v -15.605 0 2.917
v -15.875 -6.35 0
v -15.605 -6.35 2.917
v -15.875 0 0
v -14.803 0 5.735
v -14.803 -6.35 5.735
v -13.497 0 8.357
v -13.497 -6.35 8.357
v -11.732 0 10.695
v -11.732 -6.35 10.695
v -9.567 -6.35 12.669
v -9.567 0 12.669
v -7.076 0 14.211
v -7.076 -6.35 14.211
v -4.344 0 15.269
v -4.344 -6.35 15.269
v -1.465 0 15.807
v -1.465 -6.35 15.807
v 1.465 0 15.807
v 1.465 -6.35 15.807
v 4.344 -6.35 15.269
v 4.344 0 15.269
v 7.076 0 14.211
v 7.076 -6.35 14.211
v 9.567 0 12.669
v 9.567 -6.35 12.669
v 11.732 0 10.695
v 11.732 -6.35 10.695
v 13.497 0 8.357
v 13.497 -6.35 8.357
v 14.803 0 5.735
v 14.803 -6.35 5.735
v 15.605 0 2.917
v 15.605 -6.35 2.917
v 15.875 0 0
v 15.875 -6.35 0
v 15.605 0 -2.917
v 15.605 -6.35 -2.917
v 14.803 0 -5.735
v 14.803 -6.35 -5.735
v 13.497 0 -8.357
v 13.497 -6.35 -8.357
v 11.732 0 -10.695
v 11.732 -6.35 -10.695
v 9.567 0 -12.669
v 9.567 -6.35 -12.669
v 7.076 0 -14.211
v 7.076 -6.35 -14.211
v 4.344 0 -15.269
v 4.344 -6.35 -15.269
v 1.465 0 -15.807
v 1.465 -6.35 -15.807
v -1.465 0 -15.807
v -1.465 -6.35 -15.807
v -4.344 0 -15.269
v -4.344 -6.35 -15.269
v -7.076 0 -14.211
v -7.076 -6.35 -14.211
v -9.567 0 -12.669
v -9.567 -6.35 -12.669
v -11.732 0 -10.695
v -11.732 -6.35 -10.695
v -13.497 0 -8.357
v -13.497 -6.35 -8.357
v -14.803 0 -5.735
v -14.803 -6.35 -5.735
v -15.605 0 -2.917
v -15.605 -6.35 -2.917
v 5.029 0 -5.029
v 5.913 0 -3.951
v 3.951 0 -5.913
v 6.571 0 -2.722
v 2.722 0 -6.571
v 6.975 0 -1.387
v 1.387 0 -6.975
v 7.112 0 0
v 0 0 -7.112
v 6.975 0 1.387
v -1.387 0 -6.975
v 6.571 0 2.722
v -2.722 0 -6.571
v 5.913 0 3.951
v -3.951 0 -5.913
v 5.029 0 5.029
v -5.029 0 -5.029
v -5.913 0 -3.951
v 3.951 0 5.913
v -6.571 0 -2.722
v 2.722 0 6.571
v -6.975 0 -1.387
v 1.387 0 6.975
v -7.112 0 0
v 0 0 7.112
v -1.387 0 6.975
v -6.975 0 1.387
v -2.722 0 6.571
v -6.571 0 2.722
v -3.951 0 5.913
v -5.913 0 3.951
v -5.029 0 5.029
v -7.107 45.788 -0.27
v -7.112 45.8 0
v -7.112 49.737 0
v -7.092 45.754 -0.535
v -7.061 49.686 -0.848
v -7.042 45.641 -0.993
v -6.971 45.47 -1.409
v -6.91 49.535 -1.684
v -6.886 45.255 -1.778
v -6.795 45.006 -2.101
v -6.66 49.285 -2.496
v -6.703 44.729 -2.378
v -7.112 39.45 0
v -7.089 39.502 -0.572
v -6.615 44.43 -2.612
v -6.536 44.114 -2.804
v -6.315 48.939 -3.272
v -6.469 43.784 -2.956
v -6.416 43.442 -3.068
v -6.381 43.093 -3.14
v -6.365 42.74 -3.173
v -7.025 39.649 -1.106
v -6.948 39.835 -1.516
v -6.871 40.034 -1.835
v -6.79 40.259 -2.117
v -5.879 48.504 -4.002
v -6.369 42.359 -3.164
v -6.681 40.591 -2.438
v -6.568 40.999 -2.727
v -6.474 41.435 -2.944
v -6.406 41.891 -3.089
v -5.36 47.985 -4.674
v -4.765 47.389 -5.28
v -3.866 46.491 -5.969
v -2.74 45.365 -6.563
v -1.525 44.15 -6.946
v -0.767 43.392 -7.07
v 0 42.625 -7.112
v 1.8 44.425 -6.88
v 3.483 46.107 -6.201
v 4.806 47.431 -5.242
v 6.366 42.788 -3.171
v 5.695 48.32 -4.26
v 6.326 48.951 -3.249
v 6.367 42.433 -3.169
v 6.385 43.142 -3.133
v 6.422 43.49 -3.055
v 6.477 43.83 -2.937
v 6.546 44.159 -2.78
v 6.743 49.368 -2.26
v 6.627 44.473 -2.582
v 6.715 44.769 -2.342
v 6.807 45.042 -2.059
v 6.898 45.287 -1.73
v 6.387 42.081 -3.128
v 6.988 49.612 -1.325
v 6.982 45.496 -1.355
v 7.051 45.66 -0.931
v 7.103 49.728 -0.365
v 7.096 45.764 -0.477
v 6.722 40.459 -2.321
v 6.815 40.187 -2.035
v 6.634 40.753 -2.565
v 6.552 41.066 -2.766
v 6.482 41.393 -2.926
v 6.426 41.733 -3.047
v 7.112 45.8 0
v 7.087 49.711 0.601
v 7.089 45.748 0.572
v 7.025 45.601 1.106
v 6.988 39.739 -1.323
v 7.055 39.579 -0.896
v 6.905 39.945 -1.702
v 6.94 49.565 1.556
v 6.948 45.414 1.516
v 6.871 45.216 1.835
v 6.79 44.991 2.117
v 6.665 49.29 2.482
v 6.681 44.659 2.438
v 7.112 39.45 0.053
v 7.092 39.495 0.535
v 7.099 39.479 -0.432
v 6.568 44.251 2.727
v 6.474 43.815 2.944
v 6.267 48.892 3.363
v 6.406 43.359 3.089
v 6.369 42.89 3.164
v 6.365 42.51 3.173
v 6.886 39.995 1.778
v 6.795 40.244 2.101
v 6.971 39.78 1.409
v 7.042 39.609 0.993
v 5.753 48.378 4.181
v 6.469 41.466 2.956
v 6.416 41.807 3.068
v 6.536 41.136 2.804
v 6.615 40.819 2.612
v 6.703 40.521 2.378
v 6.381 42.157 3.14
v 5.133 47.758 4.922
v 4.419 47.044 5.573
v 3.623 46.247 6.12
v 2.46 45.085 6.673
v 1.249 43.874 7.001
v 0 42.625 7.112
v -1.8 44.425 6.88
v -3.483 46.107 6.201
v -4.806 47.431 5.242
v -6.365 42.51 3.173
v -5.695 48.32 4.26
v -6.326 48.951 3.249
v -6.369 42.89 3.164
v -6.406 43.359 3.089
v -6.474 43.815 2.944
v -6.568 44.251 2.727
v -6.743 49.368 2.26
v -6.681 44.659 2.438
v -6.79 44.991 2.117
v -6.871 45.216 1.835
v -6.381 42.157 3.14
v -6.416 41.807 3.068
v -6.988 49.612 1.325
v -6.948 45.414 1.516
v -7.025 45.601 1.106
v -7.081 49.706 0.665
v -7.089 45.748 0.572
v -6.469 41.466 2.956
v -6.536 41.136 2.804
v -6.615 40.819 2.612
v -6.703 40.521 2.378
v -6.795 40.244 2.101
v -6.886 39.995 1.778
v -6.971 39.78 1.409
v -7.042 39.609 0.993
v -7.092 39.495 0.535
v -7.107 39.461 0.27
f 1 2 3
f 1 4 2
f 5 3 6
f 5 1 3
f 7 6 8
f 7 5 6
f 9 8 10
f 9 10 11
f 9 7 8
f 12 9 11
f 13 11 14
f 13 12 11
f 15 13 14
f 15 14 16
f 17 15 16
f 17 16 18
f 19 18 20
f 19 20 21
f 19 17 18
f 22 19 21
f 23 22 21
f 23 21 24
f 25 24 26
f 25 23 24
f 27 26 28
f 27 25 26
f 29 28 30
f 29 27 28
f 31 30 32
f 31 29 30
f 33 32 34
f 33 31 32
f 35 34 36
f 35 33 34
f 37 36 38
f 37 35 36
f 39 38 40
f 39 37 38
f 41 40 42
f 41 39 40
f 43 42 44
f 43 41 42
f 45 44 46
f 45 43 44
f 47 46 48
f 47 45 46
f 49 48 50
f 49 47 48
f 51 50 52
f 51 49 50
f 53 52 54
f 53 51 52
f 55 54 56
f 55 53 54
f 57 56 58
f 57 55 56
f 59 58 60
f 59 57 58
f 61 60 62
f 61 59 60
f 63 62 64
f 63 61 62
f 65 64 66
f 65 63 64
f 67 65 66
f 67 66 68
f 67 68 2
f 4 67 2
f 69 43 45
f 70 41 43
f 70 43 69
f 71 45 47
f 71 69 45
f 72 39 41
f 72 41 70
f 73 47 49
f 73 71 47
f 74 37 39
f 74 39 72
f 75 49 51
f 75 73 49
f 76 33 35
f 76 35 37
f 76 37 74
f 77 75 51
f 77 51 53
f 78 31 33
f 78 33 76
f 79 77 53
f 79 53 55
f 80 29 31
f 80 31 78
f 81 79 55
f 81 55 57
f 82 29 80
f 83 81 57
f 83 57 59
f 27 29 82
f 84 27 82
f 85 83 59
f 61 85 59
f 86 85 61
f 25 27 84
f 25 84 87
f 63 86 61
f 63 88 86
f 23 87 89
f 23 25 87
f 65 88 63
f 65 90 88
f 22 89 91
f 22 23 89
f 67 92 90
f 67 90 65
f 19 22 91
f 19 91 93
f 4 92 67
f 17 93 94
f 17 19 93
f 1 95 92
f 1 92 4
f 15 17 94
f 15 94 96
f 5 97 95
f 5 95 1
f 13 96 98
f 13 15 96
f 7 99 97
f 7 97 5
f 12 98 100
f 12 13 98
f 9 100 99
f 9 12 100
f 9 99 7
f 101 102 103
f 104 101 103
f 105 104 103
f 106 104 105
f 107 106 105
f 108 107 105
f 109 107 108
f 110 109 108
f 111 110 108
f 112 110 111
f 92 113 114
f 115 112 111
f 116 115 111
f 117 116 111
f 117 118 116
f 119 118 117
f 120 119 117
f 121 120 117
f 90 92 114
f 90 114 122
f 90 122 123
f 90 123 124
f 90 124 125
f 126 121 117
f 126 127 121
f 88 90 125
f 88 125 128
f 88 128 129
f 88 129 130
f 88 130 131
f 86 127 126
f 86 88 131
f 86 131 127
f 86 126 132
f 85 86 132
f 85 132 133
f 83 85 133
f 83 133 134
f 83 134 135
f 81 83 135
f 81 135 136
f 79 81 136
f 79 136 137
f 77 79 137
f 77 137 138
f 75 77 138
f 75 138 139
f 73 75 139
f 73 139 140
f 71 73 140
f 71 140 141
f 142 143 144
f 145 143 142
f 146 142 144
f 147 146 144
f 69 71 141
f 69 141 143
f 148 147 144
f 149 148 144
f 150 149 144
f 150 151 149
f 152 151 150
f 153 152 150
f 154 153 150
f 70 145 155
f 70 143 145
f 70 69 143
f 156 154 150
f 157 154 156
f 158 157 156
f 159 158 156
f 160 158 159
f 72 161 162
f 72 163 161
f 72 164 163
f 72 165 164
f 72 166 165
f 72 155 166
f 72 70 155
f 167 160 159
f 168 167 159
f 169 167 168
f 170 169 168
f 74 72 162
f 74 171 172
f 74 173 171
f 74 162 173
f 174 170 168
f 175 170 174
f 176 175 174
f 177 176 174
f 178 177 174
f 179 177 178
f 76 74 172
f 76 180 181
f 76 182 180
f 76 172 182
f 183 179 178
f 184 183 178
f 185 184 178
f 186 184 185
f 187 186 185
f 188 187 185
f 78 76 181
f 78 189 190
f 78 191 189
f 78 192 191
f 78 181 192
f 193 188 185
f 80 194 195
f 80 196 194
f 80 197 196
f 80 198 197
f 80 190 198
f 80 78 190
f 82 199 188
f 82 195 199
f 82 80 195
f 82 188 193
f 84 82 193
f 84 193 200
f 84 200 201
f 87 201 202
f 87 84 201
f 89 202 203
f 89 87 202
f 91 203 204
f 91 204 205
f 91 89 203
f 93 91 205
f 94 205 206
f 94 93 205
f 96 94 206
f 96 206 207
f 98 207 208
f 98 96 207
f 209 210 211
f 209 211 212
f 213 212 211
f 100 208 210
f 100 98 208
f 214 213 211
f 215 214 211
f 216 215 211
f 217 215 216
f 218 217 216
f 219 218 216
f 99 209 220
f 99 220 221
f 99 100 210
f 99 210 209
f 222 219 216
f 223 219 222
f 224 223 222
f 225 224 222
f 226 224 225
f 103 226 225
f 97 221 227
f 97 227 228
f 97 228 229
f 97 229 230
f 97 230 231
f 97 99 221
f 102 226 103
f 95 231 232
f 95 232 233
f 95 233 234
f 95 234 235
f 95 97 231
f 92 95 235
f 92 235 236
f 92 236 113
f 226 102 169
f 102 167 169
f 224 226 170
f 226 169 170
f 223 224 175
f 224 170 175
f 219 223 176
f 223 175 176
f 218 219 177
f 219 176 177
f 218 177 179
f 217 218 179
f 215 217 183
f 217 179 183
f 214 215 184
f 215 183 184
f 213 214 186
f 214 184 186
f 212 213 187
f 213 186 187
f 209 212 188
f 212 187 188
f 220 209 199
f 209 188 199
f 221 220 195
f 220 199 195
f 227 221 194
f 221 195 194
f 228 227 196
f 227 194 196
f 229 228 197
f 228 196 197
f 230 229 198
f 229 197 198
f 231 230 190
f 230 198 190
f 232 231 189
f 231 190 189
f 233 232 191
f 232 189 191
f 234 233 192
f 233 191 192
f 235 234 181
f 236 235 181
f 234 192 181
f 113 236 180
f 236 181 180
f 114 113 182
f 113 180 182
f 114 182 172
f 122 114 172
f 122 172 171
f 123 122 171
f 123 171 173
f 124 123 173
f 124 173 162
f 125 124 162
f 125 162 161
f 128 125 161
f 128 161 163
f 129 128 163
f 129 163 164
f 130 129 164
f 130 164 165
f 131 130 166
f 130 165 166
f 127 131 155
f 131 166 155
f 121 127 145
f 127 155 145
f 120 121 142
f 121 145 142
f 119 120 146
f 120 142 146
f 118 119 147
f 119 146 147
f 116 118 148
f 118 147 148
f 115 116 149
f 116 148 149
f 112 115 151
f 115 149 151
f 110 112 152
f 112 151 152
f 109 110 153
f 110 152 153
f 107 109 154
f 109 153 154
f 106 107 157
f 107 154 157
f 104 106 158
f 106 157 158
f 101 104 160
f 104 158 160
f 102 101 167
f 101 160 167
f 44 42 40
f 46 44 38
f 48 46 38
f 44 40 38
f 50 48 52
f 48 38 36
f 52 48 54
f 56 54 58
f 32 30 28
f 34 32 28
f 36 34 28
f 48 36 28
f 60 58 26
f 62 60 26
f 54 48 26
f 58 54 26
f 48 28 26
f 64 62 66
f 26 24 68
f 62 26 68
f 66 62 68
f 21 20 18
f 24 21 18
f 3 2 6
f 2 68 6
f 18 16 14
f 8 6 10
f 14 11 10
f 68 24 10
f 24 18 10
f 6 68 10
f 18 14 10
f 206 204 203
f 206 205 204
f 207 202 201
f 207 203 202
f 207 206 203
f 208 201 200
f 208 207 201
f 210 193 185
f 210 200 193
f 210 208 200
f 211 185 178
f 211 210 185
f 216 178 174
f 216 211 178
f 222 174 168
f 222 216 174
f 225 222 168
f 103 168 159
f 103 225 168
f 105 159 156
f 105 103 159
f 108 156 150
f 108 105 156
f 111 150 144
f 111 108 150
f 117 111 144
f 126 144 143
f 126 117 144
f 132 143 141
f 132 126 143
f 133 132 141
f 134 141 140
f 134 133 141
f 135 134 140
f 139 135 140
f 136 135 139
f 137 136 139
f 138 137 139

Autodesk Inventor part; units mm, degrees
ref_plane "YZ Plane" through (0, 0, 0) normal (1, 0, 0) x (0, 1, 0)
ref_plane "XZ Plane" through (0, 0, 0) normal (0, 1, 0) x (-1, 0, 0)
ref_plane "XY Plane" through (0, 0, 0) normal (0, 0, 1) x (1, 0, 0)
sketch "Sketch1" plane through (0, 0, 0) normal (0, 1, 0) x (-1, 0, 0)
  circle A0 centre (0, 0) radius 15.875
  circle A1 centre (0, 0) radius 7.112
  dimension "d0" = 31.75
  dimension "d1" = 14.224
extrude "Extrusion1" add sketch "Sketch1" along normal blind 50.8 contours A1
extrude "Extrusion2" add sketch "Sketch1" against normal blind 6.35 contours A0 | A1
sketch "Sketch2" plane through (0, 0, 0) normal (1, 0, 0) x (0, 1, 0)
  line L0 (50.8, -7.112) -> (50.8, 7.112) projected
  circle A0 centre (42.6249, 0) radius 3.175
  circle A1 centre (42.6249, 0) radius 7.112
  line L1 (0, -7.112) -> (50.8, -7.112) projected
  line L2 (42.6249, -7.112) -> (42.6249, -13.9262)
  line L3 (42.6249, -13.9262) -> (57.419, -13.9262)
  line L4 (57.419, -13.9262) -> (57.419, 14.0929)
  line L5 (57.419, 14.0929) -> (42.6249, 14.0929)
  line L6 (42.6249, 14.0929) -> (42.6249, 7.112)
  point P0 (0, 0)
  point P1 (39.4499, 0)
  dimension "d7" = 6.35
extrude "Extrusion3" cut sketch "Sketch2" along normal mid plane 127 contours A0 | A1 L6 L5 L4 L3 L2
properties part number "Load Cell Test Mount to Find Required Torque Application"
